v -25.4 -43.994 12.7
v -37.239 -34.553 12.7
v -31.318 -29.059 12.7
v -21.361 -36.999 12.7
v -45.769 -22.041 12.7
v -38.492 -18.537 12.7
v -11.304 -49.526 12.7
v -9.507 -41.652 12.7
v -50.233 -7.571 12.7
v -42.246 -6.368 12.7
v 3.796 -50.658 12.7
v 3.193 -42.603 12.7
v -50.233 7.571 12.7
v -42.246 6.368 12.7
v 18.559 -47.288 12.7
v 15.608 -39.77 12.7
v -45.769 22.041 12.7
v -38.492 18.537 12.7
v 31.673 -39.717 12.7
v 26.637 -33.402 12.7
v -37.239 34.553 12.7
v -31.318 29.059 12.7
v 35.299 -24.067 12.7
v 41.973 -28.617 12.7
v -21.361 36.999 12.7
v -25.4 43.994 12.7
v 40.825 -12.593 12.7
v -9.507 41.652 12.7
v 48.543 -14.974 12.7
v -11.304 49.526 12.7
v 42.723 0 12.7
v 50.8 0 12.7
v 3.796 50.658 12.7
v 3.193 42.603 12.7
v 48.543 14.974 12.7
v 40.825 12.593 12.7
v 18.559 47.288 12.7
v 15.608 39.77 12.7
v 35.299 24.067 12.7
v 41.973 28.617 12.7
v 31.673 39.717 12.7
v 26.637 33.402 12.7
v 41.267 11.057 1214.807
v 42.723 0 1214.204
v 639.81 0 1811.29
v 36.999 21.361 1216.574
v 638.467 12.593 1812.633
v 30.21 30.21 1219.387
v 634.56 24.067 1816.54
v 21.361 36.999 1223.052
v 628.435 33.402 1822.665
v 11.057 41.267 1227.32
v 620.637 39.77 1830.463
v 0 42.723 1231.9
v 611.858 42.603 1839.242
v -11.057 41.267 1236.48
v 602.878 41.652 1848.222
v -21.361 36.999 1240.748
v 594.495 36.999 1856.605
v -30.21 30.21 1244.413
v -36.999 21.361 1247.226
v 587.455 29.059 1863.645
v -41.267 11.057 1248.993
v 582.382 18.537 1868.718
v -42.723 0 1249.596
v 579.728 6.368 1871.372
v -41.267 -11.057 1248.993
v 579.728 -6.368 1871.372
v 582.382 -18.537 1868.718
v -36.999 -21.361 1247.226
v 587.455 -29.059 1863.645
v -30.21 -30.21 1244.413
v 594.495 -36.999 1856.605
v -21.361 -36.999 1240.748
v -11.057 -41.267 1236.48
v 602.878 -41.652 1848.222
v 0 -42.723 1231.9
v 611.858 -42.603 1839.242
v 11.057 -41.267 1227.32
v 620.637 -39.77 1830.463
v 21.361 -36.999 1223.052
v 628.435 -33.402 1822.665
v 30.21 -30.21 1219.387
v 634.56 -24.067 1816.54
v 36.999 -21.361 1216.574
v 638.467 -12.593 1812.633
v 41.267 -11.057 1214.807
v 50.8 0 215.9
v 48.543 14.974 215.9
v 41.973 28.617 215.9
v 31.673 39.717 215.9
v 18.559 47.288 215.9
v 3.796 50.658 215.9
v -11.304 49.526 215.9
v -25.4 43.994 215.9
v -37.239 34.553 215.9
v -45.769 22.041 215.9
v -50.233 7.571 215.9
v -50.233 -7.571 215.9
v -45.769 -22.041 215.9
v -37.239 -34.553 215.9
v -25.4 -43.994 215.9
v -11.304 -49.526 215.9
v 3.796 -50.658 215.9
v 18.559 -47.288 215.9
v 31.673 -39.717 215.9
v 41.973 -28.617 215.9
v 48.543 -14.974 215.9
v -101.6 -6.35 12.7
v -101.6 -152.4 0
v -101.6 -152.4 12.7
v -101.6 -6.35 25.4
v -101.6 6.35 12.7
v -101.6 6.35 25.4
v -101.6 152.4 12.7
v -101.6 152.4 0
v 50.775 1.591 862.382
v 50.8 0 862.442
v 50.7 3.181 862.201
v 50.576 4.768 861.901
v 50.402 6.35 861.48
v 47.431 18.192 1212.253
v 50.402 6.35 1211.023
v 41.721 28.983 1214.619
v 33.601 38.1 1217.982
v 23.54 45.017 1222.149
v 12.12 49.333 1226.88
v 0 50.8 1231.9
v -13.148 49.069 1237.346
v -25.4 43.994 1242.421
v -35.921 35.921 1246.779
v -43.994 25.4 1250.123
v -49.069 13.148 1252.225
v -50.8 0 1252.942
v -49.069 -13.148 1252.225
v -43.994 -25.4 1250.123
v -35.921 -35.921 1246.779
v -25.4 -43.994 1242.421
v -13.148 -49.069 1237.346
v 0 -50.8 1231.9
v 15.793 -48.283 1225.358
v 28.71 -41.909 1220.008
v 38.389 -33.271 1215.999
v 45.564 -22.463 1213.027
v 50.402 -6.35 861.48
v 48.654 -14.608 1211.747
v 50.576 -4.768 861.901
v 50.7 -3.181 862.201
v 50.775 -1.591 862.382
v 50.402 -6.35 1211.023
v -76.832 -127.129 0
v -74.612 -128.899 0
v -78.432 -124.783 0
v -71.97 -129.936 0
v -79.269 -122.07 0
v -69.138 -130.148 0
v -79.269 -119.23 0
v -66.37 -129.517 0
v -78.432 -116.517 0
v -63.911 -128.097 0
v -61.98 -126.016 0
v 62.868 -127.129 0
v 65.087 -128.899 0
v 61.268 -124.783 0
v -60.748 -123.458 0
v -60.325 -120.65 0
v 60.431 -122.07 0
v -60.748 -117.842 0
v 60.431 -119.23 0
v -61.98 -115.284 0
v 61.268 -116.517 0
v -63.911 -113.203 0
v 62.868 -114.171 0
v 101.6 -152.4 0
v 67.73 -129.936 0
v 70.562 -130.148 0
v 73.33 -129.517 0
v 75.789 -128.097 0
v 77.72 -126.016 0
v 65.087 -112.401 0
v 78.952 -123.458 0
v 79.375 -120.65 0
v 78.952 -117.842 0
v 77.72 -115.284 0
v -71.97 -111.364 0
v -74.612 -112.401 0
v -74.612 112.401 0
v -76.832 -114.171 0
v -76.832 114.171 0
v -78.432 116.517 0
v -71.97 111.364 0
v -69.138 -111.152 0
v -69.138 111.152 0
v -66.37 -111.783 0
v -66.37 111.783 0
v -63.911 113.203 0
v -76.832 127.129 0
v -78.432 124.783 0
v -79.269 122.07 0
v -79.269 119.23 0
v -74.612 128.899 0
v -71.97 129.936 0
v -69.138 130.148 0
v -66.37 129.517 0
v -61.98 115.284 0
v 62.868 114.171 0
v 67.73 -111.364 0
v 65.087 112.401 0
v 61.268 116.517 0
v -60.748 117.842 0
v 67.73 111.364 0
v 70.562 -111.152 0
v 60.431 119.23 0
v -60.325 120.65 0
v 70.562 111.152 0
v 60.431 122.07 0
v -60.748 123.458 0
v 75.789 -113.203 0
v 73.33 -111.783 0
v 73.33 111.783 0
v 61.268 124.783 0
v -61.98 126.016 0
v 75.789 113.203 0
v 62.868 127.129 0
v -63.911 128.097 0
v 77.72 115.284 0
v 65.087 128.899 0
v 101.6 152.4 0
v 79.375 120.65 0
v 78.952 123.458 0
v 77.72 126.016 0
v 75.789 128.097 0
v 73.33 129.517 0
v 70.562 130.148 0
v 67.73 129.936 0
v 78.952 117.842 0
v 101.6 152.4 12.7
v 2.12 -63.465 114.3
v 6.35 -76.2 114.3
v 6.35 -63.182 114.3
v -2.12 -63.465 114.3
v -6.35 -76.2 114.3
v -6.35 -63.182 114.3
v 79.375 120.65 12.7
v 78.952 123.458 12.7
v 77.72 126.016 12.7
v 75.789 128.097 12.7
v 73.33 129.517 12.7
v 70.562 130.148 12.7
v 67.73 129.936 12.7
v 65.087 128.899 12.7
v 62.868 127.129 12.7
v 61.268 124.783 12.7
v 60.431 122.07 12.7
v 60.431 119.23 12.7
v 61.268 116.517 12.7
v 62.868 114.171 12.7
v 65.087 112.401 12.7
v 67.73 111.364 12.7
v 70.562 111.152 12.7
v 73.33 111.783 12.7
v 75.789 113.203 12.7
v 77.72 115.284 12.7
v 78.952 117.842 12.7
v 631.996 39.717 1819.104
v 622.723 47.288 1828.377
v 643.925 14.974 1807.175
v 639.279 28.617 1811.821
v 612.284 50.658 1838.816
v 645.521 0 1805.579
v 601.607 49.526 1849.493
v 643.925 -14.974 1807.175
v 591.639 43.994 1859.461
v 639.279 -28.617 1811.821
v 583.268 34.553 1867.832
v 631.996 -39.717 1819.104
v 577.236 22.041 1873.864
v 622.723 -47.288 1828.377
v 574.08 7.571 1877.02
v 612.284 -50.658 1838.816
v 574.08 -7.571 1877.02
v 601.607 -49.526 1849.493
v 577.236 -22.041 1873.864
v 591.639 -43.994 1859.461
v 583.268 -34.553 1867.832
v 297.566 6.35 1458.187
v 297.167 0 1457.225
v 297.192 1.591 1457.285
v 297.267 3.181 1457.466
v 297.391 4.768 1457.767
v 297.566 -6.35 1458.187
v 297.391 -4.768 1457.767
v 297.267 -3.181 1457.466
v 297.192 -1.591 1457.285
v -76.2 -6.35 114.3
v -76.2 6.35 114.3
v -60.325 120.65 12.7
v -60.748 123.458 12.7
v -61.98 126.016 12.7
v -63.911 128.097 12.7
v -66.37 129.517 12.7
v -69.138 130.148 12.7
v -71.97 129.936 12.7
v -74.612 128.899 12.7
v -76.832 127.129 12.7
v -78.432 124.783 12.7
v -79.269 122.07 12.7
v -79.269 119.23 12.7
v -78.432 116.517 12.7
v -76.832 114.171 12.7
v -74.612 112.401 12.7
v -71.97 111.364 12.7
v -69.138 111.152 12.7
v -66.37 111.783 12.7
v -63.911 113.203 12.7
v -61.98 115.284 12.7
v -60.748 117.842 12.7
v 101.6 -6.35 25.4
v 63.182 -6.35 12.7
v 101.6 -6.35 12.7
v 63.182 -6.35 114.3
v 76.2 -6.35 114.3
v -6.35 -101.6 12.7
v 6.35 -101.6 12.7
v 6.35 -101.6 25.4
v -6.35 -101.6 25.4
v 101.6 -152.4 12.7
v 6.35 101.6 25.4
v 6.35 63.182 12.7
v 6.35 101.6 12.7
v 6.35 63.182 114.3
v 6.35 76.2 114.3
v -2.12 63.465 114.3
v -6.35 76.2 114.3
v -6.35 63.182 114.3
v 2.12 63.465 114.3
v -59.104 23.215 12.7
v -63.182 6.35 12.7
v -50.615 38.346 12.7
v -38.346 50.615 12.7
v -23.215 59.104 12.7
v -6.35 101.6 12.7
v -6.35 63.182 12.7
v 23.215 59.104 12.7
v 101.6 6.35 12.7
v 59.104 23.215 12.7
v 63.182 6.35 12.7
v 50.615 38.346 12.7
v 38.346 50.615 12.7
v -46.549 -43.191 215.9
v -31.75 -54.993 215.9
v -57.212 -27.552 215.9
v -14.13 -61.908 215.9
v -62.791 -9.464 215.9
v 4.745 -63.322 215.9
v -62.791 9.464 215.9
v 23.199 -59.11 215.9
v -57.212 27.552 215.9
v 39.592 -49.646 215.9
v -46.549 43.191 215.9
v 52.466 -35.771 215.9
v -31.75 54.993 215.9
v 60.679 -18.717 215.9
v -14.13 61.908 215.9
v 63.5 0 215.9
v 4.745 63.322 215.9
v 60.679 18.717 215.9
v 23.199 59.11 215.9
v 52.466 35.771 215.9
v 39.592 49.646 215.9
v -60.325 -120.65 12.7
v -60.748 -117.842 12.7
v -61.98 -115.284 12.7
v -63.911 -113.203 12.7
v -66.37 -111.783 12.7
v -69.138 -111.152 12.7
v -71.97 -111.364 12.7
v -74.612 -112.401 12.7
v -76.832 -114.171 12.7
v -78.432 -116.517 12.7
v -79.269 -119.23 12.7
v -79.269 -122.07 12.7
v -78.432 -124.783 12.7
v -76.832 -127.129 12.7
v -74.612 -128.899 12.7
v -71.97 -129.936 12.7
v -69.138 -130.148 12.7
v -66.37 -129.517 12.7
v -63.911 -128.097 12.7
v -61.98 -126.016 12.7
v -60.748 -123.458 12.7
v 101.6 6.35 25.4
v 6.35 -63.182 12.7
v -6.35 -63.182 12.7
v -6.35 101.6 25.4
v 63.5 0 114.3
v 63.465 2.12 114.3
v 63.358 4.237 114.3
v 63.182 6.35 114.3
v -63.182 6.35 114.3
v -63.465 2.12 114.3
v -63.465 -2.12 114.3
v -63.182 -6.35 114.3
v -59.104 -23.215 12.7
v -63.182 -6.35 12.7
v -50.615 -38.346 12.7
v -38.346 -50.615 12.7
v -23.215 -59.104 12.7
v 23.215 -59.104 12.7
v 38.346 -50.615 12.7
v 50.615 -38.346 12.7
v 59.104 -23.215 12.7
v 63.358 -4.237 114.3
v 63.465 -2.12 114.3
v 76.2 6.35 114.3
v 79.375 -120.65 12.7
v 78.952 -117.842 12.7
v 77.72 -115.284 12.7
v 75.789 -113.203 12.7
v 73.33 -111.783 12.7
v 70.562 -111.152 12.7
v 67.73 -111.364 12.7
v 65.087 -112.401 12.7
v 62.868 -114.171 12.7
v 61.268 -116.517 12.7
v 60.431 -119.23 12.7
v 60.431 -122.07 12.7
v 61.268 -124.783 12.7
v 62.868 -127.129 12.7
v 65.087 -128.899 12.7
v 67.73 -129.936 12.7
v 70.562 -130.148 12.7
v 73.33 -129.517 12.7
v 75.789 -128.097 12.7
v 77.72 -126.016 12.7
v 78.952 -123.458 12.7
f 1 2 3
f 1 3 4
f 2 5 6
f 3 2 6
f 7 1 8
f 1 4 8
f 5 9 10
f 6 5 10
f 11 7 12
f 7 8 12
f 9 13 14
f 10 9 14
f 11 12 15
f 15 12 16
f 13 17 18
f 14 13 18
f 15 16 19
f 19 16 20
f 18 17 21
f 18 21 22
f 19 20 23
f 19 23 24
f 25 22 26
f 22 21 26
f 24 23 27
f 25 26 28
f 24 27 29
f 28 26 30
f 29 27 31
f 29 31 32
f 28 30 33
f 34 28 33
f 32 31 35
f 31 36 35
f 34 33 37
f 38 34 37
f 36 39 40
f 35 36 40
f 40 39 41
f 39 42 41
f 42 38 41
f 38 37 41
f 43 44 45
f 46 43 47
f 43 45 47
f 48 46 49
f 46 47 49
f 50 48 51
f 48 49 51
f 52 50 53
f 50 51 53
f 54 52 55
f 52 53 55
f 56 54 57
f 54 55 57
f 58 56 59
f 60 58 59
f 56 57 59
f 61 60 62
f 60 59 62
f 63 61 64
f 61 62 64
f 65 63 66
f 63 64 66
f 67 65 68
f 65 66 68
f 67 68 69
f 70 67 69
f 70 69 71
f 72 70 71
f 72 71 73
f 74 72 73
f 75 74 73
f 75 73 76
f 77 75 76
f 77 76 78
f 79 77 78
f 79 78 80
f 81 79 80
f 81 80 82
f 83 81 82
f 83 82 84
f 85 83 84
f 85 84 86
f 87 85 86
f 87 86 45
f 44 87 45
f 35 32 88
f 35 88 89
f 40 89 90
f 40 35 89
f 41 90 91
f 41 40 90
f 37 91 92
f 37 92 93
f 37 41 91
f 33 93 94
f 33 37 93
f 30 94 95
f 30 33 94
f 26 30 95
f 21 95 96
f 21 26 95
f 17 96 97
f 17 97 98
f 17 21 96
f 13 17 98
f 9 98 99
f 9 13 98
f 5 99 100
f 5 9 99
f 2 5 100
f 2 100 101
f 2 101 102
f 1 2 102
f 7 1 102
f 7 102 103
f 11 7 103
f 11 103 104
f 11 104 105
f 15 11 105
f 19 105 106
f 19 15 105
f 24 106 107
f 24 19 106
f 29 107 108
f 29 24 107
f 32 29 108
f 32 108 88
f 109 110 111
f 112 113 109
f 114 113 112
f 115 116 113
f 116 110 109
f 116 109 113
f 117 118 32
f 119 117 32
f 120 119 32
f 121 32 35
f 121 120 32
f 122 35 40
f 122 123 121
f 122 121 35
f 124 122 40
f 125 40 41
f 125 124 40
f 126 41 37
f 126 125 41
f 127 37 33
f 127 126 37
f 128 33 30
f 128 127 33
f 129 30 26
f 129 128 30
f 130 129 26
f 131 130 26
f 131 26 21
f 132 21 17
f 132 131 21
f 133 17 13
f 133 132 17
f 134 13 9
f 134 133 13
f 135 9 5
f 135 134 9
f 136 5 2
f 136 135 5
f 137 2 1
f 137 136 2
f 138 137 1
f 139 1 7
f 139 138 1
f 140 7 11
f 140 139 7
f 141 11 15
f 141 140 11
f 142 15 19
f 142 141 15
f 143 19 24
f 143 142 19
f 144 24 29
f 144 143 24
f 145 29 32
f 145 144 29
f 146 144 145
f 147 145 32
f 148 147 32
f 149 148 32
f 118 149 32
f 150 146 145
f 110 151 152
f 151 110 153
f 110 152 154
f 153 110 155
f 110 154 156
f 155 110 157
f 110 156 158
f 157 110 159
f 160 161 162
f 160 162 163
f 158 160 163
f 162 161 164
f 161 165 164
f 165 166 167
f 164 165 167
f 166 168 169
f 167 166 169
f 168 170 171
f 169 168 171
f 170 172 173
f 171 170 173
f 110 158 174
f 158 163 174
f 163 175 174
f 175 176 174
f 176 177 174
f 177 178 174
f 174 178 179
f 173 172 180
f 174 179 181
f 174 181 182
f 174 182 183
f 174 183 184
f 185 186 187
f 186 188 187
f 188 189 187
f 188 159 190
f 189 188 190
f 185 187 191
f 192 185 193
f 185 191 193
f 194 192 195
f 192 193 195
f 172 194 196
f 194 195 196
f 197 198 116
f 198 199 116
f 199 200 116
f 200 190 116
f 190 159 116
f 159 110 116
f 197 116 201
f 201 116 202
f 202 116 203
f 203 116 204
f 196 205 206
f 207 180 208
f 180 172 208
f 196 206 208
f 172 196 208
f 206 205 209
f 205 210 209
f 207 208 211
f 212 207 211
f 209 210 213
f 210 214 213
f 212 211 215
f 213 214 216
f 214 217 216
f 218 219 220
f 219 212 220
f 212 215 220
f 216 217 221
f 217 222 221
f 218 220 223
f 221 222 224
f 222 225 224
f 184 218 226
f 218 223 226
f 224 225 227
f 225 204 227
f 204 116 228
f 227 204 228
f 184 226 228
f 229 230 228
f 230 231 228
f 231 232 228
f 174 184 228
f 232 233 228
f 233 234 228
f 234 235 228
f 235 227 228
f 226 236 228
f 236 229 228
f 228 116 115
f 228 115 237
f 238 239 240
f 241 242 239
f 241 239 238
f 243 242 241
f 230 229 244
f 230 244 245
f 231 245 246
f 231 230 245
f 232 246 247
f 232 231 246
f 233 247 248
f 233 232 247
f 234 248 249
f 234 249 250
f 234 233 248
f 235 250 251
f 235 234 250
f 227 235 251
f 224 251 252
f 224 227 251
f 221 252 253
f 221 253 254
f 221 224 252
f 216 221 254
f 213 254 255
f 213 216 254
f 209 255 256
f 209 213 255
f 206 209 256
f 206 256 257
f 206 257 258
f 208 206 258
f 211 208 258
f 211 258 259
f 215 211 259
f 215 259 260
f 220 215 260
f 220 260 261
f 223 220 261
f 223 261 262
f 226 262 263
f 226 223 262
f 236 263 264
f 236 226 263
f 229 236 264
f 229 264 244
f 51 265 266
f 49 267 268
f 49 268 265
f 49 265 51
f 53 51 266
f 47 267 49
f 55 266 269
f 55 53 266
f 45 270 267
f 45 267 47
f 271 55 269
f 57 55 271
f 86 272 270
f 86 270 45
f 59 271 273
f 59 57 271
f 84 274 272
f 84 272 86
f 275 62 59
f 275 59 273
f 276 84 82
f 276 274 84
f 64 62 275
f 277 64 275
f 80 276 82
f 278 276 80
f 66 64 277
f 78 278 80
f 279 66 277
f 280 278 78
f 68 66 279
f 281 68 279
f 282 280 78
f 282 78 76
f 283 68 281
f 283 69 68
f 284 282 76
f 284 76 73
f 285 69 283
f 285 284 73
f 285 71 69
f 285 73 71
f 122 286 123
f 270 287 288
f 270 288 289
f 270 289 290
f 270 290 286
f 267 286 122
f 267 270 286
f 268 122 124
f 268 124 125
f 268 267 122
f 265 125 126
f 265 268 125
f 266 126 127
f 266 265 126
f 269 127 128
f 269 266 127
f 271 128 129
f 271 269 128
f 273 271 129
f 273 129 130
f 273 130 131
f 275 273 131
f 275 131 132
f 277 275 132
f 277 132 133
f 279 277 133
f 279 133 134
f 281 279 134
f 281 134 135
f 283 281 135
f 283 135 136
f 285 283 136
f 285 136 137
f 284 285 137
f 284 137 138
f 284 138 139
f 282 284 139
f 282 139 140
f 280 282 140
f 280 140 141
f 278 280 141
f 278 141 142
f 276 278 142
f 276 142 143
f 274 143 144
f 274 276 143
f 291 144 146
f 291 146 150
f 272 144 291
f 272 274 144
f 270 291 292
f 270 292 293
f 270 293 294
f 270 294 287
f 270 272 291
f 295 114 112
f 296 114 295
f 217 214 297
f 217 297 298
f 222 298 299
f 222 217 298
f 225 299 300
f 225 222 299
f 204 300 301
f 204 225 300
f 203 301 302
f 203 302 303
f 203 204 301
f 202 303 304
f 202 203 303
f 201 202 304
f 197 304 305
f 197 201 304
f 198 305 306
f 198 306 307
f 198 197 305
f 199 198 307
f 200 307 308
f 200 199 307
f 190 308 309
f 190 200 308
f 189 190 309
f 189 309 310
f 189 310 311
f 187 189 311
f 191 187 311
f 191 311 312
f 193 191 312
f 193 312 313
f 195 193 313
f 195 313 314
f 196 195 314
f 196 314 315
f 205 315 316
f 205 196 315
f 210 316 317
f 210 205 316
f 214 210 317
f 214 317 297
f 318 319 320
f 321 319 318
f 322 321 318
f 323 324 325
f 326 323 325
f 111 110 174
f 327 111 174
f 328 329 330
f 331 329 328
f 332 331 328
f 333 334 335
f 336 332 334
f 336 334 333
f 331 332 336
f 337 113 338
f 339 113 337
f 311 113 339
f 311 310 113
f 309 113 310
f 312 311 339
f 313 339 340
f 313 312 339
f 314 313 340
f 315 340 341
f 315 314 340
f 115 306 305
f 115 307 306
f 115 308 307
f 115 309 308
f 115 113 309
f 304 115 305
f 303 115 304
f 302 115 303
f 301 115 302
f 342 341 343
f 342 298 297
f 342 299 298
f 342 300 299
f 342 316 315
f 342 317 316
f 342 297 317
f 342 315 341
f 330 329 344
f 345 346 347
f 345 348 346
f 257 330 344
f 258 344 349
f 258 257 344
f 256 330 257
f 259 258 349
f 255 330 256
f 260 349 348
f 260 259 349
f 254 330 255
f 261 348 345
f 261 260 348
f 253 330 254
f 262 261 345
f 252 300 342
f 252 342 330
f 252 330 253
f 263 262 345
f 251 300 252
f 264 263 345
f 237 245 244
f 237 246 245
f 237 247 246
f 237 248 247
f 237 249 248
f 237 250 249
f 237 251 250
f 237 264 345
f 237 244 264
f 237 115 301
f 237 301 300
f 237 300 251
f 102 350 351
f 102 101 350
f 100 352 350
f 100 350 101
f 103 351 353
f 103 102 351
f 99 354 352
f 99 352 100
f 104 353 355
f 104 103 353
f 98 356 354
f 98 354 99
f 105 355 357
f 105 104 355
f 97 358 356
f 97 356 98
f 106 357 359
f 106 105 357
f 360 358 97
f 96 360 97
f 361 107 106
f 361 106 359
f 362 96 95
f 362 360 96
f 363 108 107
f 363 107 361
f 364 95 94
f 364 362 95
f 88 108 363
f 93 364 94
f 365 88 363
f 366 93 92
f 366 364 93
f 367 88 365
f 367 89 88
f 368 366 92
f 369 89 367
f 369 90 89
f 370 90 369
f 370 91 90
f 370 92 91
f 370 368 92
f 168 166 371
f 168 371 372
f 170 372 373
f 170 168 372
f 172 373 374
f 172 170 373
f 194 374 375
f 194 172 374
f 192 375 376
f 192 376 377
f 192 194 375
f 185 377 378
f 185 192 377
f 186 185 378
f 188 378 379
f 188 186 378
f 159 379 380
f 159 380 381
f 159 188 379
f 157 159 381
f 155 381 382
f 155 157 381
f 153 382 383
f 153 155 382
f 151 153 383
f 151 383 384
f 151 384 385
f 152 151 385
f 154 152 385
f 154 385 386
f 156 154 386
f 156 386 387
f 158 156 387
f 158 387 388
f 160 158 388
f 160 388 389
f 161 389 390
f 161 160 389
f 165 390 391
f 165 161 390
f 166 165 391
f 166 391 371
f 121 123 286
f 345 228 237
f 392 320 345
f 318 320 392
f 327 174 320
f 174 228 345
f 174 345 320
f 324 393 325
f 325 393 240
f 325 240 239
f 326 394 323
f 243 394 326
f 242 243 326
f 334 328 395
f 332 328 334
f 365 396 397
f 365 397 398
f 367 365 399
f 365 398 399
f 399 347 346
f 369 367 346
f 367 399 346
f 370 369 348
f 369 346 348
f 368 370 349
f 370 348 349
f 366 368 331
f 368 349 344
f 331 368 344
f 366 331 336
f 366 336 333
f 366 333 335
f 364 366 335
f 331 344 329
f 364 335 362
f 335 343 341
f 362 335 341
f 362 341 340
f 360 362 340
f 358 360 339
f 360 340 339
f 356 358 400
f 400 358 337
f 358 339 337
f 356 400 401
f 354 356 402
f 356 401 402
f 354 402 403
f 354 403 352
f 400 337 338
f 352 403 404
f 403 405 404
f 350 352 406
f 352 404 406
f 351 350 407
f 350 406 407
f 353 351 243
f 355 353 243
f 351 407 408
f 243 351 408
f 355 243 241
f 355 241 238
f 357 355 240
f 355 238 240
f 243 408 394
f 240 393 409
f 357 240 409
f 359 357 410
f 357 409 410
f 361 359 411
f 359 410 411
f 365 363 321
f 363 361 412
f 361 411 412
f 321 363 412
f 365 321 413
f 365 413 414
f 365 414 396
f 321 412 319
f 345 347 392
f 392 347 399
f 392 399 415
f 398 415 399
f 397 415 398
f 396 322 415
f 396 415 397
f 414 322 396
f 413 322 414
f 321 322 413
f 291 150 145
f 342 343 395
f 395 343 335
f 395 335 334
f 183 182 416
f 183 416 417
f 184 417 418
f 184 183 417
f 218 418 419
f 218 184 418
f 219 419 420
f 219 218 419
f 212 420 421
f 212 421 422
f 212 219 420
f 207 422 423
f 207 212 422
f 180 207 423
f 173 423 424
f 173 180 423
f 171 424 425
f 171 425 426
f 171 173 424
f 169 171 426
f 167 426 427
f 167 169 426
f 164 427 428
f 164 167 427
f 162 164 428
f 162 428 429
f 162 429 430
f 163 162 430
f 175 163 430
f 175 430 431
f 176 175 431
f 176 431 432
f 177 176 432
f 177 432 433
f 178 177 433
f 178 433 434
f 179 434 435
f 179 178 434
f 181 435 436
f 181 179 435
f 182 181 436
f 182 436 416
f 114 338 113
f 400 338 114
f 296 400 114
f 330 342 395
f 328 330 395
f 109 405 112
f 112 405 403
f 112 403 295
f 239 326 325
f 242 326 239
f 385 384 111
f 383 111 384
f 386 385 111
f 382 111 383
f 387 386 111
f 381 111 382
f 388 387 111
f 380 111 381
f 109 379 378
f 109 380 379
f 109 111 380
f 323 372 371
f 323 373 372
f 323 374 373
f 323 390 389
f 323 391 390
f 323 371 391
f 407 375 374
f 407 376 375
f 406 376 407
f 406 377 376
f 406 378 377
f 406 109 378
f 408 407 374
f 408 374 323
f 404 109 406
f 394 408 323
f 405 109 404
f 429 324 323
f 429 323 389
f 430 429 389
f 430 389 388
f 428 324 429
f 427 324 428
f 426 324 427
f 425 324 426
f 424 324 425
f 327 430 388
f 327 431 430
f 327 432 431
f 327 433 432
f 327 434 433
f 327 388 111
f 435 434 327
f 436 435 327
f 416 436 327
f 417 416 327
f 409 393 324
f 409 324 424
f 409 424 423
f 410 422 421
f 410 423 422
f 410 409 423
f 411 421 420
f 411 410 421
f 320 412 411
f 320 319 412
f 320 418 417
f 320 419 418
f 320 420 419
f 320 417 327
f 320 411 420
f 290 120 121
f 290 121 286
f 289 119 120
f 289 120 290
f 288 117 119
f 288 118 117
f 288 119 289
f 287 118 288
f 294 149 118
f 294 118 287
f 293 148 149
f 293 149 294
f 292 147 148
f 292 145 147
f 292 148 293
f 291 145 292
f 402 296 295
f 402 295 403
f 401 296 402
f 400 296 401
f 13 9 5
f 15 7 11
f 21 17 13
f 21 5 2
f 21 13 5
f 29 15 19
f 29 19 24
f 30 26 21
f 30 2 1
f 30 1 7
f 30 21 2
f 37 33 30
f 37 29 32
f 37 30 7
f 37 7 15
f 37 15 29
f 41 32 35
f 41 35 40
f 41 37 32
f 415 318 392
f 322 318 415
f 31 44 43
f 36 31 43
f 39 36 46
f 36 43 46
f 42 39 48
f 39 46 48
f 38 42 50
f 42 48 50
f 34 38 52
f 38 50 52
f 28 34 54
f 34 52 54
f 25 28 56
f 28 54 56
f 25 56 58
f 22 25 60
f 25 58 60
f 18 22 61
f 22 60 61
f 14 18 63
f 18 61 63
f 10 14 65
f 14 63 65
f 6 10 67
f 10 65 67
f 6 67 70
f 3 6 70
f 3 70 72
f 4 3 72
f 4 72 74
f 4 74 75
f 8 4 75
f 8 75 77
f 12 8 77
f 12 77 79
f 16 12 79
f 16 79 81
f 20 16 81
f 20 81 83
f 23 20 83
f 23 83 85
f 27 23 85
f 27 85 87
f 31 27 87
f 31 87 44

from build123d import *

# Parameters (mm, degrees)
F0_W      = 203.2
F0_H      = 304.8
F0_R      = 9.525
F1_DEPTH  = 12.7
F2_R      = 63.5
F2_R_2    = 50.8
F3_DEPTH  = 203.2
F5_R      = 50.8
F5_R_2    = 42.7228
F8_DEPTH  = 6.35
F10_DEPTH = 6.35
F11_COUNT = 4


with BuildPart() as f1:
    # F0 (on Top) → F1 (new body)
    with BuildSketch(Plane.XY):
        Rectangle(F0_W, F0_H)
        with Locations((-69.85, -120.65)):
            Circle(F0_R, mode=Mode.SUBTRACT)
        with Locations((69.85, -120.65)):
            Circle(F0_R, mode=Mode.SUBTRACT)
        with Locations((-69.85, 120.65)):
            Circle(F0_R, mode=Mode.SUBTRACT)
        with Locations((69.85, 120.65)):
            Circle(F0_R, mode=Mode.SUBTRACT)
    extrude(amount=F1_DEPTH)

    # F2 (on face) → F3 (join)
    with BuildSketch(Plane.XY.offset(12.7)):
        Circle(F2_R)
        Circle(F2_R_2, mode=Mode.SUBTRACT)
    extrude(amount=F3_DEPTH)



with BuildPart() as f6:
    # F6: sweep along a path in F4
    with BuildLine(Plane.XZ) as f6_path:
        Line((0, 12.7), (0, 1231.9))
        Line((0, 1231.9), (609.6, 1841.5))
    # F5 (on face) → F6 (sweep)
    with BuildSketch(Plane.XY.offset(12.7)):
        Circle(F5_R)
        Circle(F5_R_2, mode=Mode.SUBTRACT)
    sweep(path=f6_path.line, transition=Transition.RIGHT)

    # F7 (on Front) → F8 (join, symmetric)
    with BuildSketch(Plane.XZ):
        Polygon((299.7071713899, 1463.3572248698), (48.26, 1211.9100534799), (48.26, 856.3100534799), align=None)
    extrude(amount=F8_DEPTH, both=True)


with BuildPart() as f10:
    # F9 (on Front) → F10 (new body, symmetric)
    with BuildSketch(Plane.XZ):
        Polygon((76.2, 114.3), (63.5, 114.3), (60.96, 114.3), (60.96, 12.7), (63.5, 12.7), (101.6, 12.7), (101.6, 25.4), align=None)
    extrude(amount=F10_DEPTH, both=True)


with BuildPart() as f1_1:
    add(f1.part)

    add(f10.part)  # F11 merges F10
    # F11: F10 ×4 about axis
    f11_axis = Axis((0, 0, 12.7), (0, 0, -1))
    for i in range(1, F11_COUNT):
        add(f10.part.rotate(f11_axis, i * 360 / F11_COUNT))


solid = Compound([f6.part, f1_1.part])
